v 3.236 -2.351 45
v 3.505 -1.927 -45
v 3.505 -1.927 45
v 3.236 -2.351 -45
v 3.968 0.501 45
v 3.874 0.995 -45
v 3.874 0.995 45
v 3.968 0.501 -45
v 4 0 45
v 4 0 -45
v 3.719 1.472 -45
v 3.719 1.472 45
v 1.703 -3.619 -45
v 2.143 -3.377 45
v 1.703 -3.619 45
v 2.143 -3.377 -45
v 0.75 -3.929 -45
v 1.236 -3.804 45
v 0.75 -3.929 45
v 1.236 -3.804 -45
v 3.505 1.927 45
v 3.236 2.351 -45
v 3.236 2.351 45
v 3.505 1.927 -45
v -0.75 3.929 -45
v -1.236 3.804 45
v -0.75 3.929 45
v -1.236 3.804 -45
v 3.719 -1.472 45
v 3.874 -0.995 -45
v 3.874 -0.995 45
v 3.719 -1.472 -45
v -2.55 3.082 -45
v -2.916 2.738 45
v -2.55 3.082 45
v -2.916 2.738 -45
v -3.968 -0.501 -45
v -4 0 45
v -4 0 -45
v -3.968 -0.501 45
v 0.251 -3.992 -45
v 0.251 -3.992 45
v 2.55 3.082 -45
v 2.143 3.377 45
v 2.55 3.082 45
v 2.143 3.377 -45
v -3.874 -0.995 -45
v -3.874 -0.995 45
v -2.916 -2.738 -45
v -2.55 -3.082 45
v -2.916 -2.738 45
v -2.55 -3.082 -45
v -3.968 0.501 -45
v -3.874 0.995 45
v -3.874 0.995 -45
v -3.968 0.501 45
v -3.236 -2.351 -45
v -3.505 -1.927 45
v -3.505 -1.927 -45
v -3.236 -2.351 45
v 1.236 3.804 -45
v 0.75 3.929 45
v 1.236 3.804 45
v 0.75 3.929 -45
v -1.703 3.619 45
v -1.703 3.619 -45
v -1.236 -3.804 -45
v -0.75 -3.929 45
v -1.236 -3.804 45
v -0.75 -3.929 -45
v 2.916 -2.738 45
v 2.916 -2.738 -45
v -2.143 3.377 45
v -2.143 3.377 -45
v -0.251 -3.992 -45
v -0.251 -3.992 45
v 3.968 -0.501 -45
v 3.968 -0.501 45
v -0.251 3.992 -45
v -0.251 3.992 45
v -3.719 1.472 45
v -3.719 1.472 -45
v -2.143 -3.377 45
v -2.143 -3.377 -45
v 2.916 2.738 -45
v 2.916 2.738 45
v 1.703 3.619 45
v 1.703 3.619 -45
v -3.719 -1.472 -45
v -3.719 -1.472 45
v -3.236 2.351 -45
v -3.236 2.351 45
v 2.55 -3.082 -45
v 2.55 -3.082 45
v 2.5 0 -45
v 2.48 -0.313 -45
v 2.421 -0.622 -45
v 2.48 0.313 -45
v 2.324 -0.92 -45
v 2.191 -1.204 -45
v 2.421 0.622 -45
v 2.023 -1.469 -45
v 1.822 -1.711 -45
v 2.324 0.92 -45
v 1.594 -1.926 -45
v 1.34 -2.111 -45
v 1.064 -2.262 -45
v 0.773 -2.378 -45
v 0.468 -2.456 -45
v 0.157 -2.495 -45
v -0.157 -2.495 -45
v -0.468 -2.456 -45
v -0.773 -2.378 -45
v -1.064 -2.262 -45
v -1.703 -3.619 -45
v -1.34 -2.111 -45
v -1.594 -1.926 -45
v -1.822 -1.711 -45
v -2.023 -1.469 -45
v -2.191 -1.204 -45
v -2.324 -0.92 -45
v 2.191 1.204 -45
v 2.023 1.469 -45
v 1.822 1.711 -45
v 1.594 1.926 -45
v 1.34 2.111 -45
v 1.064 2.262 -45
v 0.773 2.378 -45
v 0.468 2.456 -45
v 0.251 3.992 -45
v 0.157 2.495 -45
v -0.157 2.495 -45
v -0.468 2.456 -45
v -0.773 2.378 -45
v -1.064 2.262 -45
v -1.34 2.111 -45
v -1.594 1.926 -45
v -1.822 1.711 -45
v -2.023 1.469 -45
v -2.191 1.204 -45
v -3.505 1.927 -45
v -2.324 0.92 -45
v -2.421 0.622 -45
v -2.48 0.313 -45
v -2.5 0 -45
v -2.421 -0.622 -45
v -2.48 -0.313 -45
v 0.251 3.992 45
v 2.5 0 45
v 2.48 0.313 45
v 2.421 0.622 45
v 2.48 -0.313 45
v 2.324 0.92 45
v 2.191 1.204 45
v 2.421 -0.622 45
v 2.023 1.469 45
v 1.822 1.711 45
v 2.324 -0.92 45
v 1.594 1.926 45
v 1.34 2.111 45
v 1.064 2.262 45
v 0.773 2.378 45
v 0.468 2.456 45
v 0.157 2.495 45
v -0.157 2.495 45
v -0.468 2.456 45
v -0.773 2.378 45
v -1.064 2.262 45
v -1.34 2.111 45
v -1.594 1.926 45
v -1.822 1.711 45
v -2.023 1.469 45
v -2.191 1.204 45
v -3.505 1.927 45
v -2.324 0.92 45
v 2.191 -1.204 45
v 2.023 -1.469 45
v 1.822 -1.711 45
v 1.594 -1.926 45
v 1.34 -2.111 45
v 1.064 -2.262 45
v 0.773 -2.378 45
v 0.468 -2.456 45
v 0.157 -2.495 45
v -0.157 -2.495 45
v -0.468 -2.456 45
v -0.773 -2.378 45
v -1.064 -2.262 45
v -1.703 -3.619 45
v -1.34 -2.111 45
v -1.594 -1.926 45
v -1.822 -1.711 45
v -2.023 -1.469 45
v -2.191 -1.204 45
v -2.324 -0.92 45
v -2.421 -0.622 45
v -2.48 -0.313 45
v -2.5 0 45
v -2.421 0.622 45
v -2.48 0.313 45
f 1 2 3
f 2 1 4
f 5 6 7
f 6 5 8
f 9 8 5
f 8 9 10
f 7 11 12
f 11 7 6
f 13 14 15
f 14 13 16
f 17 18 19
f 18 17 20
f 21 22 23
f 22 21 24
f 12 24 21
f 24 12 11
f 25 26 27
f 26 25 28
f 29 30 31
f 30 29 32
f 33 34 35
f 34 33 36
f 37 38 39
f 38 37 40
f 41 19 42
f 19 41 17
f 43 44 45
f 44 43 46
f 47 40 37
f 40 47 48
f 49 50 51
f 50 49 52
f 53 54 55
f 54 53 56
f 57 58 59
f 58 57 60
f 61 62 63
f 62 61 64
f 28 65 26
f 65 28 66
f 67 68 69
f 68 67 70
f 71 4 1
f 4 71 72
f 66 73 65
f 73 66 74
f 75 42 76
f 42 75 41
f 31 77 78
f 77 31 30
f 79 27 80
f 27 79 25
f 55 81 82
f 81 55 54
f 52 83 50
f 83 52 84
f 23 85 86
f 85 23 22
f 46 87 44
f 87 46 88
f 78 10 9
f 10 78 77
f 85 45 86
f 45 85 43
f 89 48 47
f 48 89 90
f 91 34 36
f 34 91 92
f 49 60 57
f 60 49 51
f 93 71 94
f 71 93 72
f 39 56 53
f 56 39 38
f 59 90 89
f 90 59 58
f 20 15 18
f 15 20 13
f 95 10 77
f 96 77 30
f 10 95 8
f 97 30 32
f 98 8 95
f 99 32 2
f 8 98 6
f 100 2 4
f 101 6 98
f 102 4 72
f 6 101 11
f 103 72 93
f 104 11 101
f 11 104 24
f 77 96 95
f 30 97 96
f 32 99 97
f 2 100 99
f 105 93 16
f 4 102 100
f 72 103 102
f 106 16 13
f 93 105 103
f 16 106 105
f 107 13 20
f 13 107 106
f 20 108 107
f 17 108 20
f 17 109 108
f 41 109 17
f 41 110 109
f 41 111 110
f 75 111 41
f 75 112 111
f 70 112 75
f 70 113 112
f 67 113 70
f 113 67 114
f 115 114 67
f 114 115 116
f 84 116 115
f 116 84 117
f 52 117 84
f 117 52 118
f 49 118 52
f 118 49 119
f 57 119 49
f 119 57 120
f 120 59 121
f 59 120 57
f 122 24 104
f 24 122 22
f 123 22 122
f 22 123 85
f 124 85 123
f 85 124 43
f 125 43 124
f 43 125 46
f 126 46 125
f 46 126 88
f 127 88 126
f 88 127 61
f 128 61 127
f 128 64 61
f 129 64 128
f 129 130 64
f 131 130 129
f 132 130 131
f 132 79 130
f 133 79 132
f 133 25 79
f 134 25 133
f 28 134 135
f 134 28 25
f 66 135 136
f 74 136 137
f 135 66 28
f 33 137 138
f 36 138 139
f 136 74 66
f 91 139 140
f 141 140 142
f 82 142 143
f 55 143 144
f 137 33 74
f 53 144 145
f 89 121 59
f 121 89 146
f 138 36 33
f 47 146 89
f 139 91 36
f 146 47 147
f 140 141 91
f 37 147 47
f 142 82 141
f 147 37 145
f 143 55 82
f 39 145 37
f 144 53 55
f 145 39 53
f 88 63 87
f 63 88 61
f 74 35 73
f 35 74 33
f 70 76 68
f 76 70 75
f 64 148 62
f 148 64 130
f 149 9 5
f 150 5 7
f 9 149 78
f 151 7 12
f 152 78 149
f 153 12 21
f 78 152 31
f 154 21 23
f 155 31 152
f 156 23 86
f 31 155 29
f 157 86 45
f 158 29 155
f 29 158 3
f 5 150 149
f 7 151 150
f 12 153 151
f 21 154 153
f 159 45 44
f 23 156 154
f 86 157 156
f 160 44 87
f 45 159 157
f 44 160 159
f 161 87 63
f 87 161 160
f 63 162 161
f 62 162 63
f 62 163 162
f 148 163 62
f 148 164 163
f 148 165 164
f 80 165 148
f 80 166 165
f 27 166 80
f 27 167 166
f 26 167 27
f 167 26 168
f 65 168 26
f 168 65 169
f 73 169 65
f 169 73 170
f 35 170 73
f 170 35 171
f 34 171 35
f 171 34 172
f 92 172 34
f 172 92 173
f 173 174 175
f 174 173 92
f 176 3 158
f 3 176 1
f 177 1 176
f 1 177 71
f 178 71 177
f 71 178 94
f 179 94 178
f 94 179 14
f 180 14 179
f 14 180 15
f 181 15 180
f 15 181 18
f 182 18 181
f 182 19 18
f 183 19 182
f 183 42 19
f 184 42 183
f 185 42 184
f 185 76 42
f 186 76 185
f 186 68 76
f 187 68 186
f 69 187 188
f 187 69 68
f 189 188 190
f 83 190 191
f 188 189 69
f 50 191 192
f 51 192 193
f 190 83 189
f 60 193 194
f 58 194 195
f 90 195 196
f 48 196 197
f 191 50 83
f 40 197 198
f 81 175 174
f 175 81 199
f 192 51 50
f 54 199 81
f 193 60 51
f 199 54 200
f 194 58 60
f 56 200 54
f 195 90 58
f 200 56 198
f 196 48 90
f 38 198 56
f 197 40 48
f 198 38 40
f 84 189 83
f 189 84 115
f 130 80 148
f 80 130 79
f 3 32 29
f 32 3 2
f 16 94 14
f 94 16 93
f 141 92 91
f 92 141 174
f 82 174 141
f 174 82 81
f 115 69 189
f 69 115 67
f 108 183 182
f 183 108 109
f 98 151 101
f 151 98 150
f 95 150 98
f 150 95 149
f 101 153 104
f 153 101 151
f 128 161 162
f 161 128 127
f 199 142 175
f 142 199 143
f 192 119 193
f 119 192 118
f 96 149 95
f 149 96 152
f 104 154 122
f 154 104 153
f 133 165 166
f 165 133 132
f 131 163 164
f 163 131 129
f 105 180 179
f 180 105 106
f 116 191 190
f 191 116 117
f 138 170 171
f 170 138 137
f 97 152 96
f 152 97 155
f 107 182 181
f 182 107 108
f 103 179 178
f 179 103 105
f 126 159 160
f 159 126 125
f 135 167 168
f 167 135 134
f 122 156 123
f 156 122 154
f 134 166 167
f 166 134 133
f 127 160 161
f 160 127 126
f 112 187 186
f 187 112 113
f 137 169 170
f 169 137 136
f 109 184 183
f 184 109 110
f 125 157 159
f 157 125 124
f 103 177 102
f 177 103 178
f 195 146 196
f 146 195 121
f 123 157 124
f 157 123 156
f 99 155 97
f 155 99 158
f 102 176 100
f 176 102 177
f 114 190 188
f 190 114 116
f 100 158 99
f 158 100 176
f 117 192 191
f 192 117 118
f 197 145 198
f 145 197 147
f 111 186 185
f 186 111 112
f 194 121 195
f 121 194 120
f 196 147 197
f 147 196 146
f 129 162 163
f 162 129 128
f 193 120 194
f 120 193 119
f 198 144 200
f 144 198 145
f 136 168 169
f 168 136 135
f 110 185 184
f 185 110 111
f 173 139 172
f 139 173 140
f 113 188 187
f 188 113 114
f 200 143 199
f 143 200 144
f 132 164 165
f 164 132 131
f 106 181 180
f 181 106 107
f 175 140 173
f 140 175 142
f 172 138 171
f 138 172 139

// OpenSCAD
$fn = 50;


difference() {
	union() {
		translate(v = [0, 0, -45.0000000000]) {
			cylinder(h = 90, r = 4.0000000000);
		}
	}
	union() {
		translate(v = [0, 0, -100.0000000000]) {
			cylinder(h = 200, r = 2.5000000000);
		}
	}
}
